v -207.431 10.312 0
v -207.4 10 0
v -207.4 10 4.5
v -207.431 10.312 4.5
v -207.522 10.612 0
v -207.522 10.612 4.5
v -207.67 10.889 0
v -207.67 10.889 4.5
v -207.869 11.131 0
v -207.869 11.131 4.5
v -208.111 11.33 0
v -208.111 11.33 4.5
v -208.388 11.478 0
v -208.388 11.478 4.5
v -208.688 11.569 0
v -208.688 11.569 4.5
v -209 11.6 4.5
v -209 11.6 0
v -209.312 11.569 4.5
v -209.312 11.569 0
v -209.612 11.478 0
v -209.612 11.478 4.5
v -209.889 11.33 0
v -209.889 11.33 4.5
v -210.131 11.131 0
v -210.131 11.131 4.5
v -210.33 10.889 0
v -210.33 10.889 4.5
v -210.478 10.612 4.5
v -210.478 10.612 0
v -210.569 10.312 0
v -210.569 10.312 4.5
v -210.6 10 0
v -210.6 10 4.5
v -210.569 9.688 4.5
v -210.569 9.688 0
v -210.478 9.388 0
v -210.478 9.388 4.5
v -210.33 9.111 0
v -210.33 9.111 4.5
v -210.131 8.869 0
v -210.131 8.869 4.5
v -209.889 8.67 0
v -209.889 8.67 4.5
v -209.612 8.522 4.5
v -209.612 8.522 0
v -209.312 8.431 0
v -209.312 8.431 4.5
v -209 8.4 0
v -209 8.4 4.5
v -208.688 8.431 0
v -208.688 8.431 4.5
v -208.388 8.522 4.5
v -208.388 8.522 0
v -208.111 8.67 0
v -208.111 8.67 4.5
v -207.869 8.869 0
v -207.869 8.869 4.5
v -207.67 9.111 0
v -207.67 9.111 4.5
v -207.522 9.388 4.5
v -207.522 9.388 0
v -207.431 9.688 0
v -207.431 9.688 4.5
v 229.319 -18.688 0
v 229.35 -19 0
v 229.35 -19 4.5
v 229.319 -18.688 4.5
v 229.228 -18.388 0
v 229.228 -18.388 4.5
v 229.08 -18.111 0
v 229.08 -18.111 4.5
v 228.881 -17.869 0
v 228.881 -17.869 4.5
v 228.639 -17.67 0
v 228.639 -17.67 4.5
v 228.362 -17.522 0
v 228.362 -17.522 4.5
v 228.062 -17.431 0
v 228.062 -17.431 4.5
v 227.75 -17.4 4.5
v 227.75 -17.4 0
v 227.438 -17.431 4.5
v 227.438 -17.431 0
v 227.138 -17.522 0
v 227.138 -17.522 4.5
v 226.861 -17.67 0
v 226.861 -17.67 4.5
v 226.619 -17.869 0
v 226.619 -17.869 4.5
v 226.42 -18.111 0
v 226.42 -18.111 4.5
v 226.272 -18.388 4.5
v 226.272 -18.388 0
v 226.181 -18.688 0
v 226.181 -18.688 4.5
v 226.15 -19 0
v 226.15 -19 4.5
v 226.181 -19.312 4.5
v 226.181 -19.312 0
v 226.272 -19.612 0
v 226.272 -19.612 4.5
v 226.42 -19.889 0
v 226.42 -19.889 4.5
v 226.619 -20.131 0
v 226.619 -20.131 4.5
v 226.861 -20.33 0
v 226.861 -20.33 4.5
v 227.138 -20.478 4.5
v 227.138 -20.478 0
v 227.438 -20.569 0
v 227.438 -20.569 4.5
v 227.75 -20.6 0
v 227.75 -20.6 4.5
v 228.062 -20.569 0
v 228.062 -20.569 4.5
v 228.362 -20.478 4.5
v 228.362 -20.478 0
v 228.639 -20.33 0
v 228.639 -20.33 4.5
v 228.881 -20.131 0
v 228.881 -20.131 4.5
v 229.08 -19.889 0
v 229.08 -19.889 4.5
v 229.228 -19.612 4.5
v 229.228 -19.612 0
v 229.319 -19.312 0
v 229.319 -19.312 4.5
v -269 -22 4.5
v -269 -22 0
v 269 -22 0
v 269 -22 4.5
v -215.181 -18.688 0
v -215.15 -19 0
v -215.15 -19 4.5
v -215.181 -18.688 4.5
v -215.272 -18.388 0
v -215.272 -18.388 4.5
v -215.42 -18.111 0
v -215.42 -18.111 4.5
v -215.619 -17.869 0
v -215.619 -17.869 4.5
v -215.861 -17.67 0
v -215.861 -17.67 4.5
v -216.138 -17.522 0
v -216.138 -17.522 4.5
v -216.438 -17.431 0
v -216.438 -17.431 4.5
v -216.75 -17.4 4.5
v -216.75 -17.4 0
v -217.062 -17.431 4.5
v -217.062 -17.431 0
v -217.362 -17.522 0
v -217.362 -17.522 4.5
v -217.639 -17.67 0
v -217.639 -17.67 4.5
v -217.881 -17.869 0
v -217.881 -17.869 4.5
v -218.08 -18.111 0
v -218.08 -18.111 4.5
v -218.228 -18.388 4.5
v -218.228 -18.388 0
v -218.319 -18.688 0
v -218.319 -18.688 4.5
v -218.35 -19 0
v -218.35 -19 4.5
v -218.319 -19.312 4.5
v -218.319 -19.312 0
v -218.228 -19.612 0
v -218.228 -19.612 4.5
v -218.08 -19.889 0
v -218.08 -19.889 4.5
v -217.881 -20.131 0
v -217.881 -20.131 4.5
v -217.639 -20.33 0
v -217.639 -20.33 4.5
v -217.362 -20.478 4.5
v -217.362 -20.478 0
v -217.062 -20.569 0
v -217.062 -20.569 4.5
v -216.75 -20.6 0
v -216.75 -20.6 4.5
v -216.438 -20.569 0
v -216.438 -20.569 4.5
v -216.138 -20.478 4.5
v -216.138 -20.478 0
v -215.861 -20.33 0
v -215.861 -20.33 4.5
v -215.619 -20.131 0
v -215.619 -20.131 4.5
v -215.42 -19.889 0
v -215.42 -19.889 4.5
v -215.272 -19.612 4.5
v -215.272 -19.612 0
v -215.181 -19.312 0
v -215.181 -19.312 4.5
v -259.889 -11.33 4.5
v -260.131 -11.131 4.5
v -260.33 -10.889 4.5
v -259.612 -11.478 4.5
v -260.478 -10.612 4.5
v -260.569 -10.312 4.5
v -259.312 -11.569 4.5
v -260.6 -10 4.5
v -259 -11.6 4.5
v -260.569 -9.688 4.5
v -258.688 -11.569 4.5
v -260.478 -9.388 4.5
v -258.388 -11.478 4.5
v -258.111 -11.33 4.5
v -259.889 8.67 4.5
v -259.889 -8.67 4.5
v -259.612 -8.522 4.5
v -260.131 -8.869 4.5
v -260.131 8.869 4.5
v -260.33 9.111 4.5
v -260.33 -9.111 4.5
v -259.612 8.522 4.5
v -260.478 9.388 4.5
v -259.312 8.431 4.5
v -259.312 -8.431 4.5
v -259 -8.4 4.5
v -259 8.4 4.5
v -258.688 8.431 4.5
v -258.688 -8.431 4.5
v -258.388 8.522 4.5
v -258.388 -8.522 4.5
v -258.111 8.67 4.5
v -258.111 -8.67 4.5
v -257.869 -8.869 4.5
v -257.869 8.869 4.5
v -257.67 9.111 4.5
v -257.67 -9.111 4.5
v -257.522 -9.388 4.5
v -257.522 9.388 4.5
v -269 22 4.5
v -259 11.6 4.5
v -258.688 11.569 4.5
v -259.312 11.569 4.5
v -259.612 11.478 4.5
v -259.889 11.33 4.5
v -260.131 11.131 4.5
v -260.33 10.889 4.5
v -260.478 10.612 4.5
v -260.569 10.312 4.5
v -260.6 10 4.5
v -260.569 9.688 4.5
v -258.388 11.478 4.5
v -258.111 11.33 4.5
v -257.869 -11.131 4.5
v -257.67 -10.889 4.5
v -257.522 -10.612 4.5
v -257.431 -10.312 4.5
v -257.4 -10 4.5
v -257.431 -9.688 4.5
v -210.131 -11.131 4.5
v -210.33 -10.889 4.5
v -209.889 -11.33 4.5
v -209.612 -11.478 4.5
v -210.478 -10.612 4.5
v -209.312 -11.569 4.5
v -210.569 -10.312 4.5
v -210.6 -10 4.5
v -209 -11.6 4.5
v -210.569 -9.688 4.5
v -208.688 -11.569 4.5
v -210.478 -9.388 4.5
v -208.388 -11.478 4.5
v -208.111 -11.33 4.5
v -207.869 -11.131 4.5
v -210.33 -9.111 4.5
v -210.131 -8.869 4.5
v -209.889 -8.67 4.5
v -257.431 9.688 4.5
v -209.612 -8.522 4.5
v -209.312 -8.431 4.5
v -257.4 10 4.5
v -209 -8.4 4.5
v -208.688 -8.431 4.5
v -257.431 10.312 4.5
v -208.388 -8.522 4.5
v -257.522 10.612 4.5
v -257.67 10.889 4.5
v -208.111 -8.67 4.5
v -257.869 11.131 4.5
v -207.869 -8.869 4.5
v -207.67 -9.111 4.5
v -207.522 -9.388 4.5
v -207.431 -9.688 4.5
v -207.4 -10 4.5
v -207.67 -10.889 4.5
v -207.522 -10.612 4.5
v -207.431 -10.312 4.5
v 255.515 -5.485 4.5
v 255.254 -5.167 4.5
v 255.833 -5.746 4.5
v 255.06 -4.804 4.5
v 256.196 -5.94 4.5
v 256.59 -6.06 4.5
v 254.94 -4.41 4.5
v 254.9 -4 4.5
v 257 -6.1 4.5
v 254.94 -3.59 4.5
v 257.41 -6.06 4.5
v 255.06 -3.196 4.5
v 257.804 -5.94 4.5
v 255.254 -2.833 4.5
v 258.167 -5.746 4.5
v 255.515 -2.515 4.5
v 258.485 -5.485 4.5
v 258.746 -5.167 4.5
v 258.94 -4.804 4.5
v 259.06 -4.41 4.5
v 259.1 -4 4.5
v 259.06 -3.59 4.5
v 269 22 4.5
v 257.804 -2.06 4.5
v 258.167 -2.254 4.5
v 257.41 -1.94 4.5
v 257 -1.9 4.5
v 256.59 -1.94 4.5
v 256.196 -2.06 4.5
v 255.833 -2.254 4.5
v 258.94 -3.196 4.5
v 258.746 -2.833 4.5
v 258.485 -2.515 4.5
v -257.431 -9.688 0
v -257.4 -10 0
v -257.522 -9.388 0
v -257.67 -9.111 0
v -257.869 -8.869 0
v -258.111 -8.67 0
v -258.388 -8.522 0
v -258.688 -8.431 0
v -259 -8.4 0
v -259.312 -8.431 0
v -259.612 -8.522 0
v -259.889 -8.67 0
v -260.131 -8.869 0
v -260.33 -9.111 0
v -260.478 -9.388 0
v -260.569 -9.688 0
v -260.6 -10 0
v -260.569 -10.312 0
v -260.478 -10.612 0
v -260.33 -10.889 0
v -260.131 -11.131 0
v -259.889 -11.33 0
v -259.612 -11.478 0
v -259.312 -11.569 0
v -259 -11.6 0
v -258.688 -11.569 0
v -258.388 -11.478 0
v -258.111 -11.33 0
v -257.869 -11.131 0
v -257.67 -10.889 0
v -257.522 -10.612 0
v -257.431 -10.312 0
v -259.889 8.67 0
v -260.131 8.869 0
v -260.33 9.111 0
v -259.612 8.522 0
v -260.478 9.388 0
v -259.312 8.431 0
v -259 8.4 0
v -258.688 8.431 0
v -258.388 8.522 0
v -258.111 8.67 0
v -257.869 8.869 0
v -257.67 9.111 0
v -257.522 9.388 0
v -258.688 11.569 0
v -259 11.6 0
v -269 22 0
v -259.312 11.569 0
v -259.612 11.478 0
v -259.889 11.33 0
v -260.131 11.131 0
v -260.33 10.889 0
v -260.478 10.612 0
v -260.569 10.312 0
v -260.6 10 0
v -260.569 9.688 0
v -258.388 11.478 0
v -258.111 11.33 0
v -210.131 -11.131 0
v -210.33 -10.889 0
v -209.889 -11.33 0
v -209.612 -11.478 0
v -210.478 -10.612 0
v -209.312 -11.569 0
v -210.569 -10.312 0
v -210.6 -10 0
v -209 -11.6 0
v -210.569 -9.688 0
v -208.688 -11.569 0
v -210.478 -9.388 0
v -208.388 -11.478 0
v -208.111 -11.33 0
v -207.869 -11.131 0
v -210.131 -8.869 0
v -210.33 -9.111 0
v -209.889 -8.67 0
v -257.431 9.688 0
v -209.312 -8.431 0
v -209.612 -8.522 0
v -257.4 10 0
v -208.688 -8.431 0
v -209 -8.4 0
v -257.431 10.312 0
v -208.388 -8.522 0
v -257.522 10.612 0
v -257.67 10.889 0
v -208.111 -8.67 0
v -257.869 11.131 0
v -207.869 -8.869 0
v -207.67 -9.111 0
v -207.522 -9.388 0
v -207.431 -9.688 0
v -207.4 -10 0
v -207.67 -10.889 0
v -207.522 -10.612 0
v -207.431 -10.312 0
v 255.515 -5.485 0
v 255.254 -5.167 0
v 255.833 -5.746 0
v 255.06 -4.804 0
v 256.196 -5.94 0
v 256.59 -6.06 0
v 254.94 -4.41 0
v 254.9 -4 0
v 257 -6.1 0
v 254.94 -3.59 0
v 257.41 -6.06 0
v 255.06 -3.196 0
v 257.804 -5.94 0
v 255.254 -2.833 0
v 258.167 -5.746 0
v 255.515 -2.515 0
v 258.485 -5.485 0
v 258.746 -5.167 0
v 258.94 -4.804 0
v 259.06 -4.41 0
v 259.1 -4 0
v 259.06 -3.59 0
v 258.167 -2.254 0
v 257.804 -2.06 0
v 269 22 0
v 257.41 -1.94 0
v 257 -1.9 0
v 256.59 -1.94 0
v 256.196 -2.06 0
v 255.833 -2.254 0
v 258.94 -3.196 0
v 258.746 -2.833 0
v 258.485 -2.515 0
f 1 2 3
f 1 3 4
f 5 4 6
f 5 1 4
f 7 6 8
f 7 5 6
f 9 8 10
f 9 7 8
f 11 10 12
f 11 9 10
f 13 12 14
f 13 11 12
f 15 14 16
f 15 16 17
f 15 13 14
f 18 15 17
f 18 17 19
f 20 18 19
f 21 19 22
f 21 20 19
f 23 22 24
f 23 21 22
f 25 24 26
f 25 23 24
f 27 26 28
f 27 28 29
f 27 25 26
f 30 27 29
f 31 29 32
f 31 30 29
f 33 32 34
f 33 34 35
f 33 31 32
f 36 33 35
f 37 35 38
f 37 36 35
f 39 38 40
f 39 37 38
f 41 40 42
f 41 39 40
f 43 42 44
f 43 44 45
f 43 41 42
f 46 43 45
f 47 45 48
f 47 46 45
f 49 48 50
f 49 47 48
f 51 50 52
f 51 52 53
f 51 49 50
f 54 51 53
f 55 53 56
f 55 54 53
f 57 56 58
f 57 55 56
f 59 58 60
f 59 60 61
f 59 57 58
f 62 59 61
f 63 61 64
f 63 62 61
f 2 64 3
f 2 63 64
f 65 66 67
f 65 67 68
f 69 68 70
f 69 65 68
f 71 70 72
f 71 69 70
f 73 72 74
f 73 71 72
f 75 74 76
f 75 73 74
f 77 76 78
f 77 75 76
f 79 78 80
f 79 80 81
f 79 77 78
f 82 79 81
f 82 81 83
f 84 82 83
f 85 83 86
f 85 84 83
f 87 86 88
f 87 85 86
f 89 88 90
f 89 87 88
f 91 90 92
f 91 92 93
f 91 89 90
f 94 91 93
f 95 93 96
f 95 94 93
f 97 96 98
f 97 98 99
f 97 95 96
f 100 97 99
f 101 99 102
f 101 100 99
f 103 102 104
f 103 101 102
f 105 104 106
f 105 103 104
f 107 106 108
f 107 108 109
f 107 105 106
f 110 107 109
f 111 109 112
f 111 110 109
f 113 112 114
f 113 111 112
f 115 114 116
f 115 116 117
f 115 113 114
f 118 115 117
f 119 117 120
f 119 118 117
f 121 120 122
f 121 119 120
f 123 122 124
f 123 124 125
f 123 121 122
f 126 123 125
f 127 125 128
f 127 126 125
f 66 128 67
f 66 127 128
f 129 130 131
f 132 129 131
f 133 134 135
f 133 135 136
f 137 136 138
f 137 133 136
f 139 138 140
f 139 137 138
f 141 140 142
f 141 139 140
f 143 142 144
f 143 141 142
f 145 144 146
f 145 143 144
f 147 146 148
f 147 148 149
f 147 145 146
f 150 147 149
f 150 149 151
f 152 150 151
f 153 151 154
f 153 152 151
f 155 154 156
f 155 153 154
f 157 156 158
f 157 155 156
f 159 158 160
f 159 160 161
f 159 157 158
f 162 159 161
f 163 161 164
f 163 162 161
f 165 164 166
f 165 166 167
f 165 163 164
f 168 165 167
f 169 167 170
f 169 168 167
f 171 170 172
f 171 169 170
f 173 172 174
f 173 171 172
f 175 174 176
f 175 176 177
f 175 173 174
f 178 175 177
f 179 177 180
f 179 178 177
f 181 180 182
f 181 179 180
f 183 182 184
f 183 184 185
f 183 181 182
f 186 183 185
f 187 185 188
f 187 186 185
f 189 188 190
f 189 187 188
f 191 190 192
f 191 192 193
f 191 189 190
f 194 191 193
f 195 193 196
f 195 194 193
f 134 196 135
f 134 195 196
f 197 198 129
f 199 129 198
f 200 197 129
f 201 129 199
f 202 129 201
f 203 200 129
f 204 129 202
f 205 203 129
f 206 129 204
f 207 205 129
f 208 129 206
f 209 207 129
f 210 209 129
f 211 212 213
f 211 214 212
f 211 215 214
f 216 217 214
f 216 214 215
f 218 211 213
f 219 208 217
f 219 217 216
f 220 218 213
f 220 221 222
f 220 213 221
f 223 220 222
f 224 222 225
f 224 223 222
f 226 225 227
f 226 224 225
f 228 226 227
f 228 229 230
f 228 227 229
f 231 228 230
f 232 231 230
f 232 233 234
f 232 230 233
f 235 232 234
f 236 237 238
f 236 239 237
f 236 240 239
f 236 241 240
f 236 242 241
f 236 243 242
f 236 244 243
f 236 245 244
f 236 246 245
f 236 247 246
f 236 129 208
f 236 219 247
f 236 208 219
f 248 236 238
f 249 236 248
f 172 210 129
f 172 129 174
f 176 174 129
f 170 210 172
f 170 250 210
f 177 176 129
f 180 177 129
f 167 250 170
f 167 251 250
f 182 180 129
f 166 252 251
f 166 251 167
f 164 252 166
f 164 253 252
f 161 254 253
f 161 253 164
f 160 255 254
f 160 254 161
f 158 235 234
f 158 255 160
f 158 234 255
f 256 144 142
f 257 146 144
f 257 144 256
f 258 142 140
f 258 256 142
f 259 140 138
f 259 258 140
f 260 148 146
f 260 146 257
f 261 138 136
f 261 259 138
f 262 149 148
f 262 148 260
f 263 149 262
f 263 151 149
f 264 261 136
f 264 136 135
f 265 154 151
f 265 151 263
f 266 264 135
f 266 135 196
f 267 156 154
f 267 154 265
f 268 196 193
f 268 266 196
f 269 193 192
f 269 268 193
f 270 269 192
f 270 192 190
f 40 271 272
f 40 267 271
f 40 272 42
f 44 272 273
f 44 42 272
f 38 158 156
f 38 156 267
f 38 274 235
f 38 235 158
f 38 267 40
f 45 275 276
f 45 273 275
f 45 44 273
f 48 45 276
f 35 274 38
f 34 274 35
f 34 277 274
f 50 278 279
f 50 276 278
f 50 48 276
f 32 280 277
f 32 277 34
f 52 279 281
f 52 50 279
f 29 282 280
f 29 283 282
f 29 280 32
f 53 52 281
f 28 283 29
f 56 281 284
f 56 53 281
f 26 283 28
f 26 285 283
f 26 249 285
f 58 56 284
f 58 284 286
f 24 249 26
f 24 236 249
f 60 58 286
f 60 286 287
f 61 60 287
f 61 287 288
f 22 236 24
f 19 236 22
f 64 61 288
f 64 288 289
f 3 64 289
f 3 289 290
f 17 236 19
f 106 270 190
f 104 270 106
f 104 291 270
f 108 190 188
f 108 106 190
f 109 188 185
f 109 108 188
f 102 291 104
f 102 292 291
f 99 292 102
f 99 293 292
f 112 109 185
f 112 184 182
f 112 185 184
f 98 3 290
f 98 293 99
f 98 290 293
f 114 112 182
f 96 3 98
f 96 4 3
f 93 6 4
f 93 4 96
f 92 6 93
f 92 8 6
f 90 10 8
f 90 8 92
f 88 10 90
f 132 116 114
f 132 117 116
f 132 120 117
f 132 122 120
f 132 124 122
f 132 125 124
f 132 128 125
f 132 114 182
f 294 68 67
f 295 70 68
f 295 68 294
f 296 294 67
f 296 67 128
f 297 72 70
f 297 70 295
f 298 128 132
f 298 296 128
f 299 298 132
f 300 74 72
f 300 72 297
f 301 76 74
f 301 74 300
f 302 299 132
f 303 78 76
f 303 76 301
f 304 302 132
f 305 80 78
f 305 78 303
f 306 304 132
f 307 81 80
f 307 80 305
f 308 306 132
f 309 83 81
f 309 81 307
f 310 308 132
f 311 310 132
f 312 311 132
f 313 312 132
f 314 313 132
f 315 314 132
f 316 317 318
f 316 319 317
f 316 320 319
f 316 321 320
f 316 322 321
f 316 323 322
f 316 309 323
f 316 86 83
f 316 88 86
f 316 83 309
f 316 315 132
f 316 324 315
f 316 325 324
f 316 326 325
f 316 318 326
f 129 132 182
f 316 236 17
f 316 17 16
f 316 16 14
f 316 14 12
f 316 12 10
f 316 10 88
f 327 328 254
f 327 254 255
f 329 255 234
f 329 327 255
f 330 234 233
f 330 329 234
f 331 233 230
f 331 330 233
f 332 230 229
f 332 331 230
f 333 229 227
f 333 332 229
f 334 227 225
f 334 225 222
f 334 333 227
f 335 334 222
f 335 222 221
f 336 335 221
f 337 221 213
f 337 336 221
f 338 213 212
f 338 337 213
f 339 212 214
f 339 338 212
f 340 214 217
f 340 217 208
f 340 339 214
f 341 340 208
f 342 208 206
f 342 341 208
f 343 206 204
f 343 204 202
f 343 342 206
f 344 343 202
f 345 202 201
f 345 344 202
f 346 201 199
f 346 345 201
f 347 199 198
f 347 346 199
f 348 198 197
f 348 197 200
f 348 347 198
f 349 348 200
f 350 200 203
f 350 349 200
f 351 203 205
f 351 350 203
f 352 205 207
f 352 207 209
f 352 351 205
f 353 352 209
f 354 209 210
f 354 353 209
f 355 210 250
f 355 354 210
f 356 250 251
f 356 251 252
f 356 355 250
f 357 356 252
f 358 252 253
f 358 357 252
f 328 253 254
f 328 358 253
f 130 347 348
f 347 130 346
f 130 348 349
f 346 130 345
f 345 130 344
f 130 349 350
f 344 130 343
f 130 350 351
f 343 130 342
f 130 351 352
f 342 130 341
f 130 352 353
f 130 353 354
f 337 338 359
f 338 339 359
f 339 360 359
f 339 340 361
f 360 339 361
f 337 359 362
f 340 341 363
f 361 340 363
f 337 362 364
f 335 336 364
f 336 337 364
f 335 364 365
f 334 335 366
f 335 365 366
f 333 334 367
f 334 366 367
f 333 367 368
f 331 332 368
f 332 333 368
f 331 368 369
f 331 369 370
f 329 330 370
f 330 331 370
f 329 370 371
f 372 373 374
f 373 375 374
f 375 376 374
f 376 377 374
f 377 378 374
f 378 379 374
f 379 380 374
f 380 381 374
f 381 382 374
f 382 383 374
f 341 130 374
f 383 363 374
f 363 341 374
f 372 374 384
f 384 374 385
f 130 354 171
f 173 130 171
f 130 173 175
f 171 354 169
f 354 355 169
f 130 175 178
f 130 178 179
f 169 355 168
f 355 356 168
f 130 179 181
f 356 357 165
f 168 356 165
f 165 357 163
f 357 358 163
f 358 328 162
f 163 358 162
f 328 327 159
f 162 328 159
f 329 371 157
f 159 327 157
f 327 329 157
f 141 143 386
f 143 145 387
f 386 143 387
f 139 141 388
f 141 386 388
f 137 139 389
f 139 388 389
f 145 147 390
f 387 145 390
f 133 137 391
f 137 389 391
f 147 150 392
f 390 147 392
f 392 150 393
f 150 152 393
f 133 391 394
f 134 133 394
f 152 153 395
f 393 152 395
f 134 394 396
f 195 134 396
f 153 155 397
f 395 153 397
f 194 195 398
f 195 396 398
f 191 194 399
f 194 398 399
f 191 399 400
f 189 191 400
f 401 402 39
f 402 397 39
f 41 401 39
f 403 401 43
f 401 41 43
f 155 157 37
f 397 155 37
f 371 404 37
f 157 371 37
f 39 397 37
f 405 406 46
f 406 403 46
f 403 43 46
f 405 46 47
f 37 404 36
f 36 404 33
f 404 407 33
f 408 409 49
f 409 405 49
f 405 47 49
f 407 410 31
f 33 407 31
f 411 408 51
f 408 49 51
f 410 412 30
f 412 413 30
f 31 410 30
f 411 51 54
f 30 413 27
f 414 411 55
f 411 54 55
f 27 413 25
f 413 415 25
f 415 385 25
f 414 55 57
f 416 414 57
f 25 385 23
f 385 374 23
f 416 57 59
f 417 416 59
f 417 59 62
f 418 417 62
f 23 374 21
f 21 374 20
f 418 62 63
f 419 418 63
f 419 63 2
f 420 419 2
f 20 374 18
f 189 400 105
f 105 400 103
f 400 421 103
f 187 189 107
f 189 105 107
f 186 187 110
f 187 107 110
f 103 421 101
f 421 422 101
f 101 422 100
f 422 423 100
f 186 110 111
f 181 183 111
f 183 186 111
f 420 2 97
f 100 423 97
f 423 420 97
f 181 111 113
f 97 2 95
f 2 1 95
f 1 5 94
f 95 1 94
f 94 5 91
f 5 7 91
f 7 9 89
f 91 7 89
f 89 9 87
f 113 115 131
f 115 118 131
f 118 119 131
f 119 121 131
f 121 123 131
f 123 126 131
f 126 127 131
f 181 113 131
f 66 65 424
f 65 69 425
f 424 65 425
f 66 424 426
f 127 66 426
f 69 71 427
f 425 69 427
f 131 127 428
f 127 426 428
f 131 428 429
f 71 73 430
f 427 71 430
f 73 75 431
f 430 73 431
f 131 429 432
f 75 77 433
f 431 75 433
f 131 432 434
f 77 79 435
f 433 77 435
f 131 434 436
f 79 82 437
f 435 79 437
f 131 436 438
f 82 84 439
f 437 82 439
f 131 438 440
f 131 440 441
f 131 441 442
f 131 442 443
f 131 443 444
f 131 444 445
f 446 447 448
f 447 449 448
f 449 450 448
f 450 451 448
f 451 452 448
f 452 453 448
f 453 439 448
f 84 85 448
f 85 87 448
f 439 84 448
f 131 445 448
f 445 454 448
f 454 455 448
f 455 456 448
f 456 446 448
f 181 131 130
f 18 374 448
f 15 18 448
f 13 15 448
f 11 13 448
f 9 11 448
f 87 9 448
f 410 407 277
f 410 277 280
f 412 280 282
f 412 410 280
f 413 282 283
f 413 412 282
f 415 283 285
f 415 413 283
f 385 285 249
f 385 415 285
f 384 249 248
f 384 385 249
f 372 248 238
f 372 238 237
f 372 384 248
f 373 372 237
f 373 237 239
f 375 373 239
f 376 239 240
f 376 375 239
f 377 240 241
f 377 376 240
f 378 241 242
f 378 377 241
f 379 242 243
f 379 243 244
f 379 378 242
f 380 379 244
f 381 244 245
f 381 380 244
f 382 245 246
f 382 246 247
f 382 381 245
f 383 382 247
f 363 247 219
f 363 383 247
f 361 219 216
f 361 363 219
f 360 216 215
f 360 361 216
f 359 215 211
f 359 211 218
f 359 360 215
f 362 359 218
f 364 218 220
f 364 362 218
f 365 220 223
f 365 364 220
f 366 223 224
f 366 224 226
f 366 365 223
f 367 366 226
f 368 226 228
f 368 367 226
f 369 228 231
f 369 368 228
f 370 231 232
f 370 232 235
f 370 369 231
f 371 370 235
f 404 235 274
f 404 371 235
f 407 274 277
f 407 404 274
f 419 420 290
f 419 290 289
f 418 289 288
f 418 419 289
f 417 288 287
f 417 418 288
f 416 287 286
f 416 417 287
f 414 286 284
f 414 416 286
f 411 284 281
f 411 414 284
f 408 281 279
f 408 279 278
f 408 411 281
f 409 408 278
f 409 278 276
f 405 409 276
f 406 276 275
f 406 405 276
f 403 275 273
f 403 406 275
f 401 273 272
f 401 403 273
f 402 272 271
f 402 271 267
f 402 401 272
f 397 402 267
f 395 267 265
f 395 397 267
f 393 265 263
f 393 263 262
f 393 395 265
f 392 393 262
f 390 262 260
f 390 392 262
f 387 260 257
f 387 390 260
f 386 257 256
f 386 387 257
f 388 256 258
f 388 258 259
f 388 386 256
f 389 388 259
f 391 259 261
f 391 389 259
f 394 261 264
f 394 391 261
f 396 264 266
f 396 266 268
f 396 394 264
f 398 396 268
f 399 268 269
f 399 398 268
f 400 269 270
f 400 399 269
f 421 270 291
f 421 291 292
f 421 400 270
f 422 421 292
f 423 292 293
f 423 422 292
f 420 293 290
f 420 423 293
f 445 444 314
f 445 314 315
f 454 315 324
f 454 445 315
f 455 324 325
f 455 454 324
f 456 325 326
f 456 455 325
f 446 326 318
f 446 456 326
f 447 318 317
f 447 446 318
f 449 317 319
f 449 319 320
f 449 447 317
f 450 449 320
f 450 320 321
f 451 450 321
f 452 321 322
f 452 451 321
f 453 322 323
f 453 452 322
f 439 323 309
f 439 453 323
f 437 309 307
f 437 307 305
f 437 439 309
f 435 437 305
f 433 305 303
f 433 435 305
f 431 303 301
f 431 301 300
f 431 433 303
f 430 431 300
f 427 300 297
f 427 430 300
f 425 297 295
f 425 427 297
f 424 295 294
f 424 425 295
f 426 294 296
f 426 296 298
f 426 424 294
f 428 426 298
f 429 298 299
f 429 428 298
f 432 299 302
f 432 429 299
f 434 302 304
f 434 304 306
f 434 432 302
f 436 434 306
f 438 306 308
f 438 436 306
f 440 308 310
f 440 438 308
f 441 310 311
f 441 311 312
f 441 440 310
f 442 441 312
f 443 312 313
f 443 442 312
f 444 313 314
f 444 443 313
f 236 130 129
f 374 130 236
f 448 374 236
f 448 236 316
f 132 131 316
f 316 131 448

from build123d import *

# Parameters (mm, degrees)
SKETCH1_W           = 538
SKETCH1_H           = 44
SKETCH1_R           = 2.1
SKETCH1_R_2         = 1.6
BOSS_EXTRUDE1_DEPTH = 4.5


with BuildPart() as part:
    # Sketch1 → Boss-Extrude1 (new body)
    with BuildSketch(Plane.XY):
        Rectangle(SKETCH1_W, SKETCH1_H)
        with Locations((257, -4)):
            Circle(SKETCH1_R, mode=Mode.SUBTRACT)
        with Locations((-259, 10)):
            Circle(SKETCH1_R_2, mode=Mode.SUBTRACT)
        with Locations((-209, 10)):
            Circle(SKETCH1_R_2, mode=Mode.SUBTRACT)
        with Locations((-209, -10)):
            Circle(SKETCH1_R_2, mode=Mode.SUBTRACT)
        with Locations((-259, -10)):
            Circle(SKETCH1_R_2, mode=Mode.SUBTRACT)
        with Locations((227.75, -19)):
            Circle(SKETCH1_R_2, mode=Mode.SUBTRACT)
        with Locations((-216.75, -19)):
            Circle(SKETCH1_R_2, mode=Mode.SUBTRACT)
    extrude(amount=BOSS_EXTRUDE1_DEPTH)


solid = part.part
